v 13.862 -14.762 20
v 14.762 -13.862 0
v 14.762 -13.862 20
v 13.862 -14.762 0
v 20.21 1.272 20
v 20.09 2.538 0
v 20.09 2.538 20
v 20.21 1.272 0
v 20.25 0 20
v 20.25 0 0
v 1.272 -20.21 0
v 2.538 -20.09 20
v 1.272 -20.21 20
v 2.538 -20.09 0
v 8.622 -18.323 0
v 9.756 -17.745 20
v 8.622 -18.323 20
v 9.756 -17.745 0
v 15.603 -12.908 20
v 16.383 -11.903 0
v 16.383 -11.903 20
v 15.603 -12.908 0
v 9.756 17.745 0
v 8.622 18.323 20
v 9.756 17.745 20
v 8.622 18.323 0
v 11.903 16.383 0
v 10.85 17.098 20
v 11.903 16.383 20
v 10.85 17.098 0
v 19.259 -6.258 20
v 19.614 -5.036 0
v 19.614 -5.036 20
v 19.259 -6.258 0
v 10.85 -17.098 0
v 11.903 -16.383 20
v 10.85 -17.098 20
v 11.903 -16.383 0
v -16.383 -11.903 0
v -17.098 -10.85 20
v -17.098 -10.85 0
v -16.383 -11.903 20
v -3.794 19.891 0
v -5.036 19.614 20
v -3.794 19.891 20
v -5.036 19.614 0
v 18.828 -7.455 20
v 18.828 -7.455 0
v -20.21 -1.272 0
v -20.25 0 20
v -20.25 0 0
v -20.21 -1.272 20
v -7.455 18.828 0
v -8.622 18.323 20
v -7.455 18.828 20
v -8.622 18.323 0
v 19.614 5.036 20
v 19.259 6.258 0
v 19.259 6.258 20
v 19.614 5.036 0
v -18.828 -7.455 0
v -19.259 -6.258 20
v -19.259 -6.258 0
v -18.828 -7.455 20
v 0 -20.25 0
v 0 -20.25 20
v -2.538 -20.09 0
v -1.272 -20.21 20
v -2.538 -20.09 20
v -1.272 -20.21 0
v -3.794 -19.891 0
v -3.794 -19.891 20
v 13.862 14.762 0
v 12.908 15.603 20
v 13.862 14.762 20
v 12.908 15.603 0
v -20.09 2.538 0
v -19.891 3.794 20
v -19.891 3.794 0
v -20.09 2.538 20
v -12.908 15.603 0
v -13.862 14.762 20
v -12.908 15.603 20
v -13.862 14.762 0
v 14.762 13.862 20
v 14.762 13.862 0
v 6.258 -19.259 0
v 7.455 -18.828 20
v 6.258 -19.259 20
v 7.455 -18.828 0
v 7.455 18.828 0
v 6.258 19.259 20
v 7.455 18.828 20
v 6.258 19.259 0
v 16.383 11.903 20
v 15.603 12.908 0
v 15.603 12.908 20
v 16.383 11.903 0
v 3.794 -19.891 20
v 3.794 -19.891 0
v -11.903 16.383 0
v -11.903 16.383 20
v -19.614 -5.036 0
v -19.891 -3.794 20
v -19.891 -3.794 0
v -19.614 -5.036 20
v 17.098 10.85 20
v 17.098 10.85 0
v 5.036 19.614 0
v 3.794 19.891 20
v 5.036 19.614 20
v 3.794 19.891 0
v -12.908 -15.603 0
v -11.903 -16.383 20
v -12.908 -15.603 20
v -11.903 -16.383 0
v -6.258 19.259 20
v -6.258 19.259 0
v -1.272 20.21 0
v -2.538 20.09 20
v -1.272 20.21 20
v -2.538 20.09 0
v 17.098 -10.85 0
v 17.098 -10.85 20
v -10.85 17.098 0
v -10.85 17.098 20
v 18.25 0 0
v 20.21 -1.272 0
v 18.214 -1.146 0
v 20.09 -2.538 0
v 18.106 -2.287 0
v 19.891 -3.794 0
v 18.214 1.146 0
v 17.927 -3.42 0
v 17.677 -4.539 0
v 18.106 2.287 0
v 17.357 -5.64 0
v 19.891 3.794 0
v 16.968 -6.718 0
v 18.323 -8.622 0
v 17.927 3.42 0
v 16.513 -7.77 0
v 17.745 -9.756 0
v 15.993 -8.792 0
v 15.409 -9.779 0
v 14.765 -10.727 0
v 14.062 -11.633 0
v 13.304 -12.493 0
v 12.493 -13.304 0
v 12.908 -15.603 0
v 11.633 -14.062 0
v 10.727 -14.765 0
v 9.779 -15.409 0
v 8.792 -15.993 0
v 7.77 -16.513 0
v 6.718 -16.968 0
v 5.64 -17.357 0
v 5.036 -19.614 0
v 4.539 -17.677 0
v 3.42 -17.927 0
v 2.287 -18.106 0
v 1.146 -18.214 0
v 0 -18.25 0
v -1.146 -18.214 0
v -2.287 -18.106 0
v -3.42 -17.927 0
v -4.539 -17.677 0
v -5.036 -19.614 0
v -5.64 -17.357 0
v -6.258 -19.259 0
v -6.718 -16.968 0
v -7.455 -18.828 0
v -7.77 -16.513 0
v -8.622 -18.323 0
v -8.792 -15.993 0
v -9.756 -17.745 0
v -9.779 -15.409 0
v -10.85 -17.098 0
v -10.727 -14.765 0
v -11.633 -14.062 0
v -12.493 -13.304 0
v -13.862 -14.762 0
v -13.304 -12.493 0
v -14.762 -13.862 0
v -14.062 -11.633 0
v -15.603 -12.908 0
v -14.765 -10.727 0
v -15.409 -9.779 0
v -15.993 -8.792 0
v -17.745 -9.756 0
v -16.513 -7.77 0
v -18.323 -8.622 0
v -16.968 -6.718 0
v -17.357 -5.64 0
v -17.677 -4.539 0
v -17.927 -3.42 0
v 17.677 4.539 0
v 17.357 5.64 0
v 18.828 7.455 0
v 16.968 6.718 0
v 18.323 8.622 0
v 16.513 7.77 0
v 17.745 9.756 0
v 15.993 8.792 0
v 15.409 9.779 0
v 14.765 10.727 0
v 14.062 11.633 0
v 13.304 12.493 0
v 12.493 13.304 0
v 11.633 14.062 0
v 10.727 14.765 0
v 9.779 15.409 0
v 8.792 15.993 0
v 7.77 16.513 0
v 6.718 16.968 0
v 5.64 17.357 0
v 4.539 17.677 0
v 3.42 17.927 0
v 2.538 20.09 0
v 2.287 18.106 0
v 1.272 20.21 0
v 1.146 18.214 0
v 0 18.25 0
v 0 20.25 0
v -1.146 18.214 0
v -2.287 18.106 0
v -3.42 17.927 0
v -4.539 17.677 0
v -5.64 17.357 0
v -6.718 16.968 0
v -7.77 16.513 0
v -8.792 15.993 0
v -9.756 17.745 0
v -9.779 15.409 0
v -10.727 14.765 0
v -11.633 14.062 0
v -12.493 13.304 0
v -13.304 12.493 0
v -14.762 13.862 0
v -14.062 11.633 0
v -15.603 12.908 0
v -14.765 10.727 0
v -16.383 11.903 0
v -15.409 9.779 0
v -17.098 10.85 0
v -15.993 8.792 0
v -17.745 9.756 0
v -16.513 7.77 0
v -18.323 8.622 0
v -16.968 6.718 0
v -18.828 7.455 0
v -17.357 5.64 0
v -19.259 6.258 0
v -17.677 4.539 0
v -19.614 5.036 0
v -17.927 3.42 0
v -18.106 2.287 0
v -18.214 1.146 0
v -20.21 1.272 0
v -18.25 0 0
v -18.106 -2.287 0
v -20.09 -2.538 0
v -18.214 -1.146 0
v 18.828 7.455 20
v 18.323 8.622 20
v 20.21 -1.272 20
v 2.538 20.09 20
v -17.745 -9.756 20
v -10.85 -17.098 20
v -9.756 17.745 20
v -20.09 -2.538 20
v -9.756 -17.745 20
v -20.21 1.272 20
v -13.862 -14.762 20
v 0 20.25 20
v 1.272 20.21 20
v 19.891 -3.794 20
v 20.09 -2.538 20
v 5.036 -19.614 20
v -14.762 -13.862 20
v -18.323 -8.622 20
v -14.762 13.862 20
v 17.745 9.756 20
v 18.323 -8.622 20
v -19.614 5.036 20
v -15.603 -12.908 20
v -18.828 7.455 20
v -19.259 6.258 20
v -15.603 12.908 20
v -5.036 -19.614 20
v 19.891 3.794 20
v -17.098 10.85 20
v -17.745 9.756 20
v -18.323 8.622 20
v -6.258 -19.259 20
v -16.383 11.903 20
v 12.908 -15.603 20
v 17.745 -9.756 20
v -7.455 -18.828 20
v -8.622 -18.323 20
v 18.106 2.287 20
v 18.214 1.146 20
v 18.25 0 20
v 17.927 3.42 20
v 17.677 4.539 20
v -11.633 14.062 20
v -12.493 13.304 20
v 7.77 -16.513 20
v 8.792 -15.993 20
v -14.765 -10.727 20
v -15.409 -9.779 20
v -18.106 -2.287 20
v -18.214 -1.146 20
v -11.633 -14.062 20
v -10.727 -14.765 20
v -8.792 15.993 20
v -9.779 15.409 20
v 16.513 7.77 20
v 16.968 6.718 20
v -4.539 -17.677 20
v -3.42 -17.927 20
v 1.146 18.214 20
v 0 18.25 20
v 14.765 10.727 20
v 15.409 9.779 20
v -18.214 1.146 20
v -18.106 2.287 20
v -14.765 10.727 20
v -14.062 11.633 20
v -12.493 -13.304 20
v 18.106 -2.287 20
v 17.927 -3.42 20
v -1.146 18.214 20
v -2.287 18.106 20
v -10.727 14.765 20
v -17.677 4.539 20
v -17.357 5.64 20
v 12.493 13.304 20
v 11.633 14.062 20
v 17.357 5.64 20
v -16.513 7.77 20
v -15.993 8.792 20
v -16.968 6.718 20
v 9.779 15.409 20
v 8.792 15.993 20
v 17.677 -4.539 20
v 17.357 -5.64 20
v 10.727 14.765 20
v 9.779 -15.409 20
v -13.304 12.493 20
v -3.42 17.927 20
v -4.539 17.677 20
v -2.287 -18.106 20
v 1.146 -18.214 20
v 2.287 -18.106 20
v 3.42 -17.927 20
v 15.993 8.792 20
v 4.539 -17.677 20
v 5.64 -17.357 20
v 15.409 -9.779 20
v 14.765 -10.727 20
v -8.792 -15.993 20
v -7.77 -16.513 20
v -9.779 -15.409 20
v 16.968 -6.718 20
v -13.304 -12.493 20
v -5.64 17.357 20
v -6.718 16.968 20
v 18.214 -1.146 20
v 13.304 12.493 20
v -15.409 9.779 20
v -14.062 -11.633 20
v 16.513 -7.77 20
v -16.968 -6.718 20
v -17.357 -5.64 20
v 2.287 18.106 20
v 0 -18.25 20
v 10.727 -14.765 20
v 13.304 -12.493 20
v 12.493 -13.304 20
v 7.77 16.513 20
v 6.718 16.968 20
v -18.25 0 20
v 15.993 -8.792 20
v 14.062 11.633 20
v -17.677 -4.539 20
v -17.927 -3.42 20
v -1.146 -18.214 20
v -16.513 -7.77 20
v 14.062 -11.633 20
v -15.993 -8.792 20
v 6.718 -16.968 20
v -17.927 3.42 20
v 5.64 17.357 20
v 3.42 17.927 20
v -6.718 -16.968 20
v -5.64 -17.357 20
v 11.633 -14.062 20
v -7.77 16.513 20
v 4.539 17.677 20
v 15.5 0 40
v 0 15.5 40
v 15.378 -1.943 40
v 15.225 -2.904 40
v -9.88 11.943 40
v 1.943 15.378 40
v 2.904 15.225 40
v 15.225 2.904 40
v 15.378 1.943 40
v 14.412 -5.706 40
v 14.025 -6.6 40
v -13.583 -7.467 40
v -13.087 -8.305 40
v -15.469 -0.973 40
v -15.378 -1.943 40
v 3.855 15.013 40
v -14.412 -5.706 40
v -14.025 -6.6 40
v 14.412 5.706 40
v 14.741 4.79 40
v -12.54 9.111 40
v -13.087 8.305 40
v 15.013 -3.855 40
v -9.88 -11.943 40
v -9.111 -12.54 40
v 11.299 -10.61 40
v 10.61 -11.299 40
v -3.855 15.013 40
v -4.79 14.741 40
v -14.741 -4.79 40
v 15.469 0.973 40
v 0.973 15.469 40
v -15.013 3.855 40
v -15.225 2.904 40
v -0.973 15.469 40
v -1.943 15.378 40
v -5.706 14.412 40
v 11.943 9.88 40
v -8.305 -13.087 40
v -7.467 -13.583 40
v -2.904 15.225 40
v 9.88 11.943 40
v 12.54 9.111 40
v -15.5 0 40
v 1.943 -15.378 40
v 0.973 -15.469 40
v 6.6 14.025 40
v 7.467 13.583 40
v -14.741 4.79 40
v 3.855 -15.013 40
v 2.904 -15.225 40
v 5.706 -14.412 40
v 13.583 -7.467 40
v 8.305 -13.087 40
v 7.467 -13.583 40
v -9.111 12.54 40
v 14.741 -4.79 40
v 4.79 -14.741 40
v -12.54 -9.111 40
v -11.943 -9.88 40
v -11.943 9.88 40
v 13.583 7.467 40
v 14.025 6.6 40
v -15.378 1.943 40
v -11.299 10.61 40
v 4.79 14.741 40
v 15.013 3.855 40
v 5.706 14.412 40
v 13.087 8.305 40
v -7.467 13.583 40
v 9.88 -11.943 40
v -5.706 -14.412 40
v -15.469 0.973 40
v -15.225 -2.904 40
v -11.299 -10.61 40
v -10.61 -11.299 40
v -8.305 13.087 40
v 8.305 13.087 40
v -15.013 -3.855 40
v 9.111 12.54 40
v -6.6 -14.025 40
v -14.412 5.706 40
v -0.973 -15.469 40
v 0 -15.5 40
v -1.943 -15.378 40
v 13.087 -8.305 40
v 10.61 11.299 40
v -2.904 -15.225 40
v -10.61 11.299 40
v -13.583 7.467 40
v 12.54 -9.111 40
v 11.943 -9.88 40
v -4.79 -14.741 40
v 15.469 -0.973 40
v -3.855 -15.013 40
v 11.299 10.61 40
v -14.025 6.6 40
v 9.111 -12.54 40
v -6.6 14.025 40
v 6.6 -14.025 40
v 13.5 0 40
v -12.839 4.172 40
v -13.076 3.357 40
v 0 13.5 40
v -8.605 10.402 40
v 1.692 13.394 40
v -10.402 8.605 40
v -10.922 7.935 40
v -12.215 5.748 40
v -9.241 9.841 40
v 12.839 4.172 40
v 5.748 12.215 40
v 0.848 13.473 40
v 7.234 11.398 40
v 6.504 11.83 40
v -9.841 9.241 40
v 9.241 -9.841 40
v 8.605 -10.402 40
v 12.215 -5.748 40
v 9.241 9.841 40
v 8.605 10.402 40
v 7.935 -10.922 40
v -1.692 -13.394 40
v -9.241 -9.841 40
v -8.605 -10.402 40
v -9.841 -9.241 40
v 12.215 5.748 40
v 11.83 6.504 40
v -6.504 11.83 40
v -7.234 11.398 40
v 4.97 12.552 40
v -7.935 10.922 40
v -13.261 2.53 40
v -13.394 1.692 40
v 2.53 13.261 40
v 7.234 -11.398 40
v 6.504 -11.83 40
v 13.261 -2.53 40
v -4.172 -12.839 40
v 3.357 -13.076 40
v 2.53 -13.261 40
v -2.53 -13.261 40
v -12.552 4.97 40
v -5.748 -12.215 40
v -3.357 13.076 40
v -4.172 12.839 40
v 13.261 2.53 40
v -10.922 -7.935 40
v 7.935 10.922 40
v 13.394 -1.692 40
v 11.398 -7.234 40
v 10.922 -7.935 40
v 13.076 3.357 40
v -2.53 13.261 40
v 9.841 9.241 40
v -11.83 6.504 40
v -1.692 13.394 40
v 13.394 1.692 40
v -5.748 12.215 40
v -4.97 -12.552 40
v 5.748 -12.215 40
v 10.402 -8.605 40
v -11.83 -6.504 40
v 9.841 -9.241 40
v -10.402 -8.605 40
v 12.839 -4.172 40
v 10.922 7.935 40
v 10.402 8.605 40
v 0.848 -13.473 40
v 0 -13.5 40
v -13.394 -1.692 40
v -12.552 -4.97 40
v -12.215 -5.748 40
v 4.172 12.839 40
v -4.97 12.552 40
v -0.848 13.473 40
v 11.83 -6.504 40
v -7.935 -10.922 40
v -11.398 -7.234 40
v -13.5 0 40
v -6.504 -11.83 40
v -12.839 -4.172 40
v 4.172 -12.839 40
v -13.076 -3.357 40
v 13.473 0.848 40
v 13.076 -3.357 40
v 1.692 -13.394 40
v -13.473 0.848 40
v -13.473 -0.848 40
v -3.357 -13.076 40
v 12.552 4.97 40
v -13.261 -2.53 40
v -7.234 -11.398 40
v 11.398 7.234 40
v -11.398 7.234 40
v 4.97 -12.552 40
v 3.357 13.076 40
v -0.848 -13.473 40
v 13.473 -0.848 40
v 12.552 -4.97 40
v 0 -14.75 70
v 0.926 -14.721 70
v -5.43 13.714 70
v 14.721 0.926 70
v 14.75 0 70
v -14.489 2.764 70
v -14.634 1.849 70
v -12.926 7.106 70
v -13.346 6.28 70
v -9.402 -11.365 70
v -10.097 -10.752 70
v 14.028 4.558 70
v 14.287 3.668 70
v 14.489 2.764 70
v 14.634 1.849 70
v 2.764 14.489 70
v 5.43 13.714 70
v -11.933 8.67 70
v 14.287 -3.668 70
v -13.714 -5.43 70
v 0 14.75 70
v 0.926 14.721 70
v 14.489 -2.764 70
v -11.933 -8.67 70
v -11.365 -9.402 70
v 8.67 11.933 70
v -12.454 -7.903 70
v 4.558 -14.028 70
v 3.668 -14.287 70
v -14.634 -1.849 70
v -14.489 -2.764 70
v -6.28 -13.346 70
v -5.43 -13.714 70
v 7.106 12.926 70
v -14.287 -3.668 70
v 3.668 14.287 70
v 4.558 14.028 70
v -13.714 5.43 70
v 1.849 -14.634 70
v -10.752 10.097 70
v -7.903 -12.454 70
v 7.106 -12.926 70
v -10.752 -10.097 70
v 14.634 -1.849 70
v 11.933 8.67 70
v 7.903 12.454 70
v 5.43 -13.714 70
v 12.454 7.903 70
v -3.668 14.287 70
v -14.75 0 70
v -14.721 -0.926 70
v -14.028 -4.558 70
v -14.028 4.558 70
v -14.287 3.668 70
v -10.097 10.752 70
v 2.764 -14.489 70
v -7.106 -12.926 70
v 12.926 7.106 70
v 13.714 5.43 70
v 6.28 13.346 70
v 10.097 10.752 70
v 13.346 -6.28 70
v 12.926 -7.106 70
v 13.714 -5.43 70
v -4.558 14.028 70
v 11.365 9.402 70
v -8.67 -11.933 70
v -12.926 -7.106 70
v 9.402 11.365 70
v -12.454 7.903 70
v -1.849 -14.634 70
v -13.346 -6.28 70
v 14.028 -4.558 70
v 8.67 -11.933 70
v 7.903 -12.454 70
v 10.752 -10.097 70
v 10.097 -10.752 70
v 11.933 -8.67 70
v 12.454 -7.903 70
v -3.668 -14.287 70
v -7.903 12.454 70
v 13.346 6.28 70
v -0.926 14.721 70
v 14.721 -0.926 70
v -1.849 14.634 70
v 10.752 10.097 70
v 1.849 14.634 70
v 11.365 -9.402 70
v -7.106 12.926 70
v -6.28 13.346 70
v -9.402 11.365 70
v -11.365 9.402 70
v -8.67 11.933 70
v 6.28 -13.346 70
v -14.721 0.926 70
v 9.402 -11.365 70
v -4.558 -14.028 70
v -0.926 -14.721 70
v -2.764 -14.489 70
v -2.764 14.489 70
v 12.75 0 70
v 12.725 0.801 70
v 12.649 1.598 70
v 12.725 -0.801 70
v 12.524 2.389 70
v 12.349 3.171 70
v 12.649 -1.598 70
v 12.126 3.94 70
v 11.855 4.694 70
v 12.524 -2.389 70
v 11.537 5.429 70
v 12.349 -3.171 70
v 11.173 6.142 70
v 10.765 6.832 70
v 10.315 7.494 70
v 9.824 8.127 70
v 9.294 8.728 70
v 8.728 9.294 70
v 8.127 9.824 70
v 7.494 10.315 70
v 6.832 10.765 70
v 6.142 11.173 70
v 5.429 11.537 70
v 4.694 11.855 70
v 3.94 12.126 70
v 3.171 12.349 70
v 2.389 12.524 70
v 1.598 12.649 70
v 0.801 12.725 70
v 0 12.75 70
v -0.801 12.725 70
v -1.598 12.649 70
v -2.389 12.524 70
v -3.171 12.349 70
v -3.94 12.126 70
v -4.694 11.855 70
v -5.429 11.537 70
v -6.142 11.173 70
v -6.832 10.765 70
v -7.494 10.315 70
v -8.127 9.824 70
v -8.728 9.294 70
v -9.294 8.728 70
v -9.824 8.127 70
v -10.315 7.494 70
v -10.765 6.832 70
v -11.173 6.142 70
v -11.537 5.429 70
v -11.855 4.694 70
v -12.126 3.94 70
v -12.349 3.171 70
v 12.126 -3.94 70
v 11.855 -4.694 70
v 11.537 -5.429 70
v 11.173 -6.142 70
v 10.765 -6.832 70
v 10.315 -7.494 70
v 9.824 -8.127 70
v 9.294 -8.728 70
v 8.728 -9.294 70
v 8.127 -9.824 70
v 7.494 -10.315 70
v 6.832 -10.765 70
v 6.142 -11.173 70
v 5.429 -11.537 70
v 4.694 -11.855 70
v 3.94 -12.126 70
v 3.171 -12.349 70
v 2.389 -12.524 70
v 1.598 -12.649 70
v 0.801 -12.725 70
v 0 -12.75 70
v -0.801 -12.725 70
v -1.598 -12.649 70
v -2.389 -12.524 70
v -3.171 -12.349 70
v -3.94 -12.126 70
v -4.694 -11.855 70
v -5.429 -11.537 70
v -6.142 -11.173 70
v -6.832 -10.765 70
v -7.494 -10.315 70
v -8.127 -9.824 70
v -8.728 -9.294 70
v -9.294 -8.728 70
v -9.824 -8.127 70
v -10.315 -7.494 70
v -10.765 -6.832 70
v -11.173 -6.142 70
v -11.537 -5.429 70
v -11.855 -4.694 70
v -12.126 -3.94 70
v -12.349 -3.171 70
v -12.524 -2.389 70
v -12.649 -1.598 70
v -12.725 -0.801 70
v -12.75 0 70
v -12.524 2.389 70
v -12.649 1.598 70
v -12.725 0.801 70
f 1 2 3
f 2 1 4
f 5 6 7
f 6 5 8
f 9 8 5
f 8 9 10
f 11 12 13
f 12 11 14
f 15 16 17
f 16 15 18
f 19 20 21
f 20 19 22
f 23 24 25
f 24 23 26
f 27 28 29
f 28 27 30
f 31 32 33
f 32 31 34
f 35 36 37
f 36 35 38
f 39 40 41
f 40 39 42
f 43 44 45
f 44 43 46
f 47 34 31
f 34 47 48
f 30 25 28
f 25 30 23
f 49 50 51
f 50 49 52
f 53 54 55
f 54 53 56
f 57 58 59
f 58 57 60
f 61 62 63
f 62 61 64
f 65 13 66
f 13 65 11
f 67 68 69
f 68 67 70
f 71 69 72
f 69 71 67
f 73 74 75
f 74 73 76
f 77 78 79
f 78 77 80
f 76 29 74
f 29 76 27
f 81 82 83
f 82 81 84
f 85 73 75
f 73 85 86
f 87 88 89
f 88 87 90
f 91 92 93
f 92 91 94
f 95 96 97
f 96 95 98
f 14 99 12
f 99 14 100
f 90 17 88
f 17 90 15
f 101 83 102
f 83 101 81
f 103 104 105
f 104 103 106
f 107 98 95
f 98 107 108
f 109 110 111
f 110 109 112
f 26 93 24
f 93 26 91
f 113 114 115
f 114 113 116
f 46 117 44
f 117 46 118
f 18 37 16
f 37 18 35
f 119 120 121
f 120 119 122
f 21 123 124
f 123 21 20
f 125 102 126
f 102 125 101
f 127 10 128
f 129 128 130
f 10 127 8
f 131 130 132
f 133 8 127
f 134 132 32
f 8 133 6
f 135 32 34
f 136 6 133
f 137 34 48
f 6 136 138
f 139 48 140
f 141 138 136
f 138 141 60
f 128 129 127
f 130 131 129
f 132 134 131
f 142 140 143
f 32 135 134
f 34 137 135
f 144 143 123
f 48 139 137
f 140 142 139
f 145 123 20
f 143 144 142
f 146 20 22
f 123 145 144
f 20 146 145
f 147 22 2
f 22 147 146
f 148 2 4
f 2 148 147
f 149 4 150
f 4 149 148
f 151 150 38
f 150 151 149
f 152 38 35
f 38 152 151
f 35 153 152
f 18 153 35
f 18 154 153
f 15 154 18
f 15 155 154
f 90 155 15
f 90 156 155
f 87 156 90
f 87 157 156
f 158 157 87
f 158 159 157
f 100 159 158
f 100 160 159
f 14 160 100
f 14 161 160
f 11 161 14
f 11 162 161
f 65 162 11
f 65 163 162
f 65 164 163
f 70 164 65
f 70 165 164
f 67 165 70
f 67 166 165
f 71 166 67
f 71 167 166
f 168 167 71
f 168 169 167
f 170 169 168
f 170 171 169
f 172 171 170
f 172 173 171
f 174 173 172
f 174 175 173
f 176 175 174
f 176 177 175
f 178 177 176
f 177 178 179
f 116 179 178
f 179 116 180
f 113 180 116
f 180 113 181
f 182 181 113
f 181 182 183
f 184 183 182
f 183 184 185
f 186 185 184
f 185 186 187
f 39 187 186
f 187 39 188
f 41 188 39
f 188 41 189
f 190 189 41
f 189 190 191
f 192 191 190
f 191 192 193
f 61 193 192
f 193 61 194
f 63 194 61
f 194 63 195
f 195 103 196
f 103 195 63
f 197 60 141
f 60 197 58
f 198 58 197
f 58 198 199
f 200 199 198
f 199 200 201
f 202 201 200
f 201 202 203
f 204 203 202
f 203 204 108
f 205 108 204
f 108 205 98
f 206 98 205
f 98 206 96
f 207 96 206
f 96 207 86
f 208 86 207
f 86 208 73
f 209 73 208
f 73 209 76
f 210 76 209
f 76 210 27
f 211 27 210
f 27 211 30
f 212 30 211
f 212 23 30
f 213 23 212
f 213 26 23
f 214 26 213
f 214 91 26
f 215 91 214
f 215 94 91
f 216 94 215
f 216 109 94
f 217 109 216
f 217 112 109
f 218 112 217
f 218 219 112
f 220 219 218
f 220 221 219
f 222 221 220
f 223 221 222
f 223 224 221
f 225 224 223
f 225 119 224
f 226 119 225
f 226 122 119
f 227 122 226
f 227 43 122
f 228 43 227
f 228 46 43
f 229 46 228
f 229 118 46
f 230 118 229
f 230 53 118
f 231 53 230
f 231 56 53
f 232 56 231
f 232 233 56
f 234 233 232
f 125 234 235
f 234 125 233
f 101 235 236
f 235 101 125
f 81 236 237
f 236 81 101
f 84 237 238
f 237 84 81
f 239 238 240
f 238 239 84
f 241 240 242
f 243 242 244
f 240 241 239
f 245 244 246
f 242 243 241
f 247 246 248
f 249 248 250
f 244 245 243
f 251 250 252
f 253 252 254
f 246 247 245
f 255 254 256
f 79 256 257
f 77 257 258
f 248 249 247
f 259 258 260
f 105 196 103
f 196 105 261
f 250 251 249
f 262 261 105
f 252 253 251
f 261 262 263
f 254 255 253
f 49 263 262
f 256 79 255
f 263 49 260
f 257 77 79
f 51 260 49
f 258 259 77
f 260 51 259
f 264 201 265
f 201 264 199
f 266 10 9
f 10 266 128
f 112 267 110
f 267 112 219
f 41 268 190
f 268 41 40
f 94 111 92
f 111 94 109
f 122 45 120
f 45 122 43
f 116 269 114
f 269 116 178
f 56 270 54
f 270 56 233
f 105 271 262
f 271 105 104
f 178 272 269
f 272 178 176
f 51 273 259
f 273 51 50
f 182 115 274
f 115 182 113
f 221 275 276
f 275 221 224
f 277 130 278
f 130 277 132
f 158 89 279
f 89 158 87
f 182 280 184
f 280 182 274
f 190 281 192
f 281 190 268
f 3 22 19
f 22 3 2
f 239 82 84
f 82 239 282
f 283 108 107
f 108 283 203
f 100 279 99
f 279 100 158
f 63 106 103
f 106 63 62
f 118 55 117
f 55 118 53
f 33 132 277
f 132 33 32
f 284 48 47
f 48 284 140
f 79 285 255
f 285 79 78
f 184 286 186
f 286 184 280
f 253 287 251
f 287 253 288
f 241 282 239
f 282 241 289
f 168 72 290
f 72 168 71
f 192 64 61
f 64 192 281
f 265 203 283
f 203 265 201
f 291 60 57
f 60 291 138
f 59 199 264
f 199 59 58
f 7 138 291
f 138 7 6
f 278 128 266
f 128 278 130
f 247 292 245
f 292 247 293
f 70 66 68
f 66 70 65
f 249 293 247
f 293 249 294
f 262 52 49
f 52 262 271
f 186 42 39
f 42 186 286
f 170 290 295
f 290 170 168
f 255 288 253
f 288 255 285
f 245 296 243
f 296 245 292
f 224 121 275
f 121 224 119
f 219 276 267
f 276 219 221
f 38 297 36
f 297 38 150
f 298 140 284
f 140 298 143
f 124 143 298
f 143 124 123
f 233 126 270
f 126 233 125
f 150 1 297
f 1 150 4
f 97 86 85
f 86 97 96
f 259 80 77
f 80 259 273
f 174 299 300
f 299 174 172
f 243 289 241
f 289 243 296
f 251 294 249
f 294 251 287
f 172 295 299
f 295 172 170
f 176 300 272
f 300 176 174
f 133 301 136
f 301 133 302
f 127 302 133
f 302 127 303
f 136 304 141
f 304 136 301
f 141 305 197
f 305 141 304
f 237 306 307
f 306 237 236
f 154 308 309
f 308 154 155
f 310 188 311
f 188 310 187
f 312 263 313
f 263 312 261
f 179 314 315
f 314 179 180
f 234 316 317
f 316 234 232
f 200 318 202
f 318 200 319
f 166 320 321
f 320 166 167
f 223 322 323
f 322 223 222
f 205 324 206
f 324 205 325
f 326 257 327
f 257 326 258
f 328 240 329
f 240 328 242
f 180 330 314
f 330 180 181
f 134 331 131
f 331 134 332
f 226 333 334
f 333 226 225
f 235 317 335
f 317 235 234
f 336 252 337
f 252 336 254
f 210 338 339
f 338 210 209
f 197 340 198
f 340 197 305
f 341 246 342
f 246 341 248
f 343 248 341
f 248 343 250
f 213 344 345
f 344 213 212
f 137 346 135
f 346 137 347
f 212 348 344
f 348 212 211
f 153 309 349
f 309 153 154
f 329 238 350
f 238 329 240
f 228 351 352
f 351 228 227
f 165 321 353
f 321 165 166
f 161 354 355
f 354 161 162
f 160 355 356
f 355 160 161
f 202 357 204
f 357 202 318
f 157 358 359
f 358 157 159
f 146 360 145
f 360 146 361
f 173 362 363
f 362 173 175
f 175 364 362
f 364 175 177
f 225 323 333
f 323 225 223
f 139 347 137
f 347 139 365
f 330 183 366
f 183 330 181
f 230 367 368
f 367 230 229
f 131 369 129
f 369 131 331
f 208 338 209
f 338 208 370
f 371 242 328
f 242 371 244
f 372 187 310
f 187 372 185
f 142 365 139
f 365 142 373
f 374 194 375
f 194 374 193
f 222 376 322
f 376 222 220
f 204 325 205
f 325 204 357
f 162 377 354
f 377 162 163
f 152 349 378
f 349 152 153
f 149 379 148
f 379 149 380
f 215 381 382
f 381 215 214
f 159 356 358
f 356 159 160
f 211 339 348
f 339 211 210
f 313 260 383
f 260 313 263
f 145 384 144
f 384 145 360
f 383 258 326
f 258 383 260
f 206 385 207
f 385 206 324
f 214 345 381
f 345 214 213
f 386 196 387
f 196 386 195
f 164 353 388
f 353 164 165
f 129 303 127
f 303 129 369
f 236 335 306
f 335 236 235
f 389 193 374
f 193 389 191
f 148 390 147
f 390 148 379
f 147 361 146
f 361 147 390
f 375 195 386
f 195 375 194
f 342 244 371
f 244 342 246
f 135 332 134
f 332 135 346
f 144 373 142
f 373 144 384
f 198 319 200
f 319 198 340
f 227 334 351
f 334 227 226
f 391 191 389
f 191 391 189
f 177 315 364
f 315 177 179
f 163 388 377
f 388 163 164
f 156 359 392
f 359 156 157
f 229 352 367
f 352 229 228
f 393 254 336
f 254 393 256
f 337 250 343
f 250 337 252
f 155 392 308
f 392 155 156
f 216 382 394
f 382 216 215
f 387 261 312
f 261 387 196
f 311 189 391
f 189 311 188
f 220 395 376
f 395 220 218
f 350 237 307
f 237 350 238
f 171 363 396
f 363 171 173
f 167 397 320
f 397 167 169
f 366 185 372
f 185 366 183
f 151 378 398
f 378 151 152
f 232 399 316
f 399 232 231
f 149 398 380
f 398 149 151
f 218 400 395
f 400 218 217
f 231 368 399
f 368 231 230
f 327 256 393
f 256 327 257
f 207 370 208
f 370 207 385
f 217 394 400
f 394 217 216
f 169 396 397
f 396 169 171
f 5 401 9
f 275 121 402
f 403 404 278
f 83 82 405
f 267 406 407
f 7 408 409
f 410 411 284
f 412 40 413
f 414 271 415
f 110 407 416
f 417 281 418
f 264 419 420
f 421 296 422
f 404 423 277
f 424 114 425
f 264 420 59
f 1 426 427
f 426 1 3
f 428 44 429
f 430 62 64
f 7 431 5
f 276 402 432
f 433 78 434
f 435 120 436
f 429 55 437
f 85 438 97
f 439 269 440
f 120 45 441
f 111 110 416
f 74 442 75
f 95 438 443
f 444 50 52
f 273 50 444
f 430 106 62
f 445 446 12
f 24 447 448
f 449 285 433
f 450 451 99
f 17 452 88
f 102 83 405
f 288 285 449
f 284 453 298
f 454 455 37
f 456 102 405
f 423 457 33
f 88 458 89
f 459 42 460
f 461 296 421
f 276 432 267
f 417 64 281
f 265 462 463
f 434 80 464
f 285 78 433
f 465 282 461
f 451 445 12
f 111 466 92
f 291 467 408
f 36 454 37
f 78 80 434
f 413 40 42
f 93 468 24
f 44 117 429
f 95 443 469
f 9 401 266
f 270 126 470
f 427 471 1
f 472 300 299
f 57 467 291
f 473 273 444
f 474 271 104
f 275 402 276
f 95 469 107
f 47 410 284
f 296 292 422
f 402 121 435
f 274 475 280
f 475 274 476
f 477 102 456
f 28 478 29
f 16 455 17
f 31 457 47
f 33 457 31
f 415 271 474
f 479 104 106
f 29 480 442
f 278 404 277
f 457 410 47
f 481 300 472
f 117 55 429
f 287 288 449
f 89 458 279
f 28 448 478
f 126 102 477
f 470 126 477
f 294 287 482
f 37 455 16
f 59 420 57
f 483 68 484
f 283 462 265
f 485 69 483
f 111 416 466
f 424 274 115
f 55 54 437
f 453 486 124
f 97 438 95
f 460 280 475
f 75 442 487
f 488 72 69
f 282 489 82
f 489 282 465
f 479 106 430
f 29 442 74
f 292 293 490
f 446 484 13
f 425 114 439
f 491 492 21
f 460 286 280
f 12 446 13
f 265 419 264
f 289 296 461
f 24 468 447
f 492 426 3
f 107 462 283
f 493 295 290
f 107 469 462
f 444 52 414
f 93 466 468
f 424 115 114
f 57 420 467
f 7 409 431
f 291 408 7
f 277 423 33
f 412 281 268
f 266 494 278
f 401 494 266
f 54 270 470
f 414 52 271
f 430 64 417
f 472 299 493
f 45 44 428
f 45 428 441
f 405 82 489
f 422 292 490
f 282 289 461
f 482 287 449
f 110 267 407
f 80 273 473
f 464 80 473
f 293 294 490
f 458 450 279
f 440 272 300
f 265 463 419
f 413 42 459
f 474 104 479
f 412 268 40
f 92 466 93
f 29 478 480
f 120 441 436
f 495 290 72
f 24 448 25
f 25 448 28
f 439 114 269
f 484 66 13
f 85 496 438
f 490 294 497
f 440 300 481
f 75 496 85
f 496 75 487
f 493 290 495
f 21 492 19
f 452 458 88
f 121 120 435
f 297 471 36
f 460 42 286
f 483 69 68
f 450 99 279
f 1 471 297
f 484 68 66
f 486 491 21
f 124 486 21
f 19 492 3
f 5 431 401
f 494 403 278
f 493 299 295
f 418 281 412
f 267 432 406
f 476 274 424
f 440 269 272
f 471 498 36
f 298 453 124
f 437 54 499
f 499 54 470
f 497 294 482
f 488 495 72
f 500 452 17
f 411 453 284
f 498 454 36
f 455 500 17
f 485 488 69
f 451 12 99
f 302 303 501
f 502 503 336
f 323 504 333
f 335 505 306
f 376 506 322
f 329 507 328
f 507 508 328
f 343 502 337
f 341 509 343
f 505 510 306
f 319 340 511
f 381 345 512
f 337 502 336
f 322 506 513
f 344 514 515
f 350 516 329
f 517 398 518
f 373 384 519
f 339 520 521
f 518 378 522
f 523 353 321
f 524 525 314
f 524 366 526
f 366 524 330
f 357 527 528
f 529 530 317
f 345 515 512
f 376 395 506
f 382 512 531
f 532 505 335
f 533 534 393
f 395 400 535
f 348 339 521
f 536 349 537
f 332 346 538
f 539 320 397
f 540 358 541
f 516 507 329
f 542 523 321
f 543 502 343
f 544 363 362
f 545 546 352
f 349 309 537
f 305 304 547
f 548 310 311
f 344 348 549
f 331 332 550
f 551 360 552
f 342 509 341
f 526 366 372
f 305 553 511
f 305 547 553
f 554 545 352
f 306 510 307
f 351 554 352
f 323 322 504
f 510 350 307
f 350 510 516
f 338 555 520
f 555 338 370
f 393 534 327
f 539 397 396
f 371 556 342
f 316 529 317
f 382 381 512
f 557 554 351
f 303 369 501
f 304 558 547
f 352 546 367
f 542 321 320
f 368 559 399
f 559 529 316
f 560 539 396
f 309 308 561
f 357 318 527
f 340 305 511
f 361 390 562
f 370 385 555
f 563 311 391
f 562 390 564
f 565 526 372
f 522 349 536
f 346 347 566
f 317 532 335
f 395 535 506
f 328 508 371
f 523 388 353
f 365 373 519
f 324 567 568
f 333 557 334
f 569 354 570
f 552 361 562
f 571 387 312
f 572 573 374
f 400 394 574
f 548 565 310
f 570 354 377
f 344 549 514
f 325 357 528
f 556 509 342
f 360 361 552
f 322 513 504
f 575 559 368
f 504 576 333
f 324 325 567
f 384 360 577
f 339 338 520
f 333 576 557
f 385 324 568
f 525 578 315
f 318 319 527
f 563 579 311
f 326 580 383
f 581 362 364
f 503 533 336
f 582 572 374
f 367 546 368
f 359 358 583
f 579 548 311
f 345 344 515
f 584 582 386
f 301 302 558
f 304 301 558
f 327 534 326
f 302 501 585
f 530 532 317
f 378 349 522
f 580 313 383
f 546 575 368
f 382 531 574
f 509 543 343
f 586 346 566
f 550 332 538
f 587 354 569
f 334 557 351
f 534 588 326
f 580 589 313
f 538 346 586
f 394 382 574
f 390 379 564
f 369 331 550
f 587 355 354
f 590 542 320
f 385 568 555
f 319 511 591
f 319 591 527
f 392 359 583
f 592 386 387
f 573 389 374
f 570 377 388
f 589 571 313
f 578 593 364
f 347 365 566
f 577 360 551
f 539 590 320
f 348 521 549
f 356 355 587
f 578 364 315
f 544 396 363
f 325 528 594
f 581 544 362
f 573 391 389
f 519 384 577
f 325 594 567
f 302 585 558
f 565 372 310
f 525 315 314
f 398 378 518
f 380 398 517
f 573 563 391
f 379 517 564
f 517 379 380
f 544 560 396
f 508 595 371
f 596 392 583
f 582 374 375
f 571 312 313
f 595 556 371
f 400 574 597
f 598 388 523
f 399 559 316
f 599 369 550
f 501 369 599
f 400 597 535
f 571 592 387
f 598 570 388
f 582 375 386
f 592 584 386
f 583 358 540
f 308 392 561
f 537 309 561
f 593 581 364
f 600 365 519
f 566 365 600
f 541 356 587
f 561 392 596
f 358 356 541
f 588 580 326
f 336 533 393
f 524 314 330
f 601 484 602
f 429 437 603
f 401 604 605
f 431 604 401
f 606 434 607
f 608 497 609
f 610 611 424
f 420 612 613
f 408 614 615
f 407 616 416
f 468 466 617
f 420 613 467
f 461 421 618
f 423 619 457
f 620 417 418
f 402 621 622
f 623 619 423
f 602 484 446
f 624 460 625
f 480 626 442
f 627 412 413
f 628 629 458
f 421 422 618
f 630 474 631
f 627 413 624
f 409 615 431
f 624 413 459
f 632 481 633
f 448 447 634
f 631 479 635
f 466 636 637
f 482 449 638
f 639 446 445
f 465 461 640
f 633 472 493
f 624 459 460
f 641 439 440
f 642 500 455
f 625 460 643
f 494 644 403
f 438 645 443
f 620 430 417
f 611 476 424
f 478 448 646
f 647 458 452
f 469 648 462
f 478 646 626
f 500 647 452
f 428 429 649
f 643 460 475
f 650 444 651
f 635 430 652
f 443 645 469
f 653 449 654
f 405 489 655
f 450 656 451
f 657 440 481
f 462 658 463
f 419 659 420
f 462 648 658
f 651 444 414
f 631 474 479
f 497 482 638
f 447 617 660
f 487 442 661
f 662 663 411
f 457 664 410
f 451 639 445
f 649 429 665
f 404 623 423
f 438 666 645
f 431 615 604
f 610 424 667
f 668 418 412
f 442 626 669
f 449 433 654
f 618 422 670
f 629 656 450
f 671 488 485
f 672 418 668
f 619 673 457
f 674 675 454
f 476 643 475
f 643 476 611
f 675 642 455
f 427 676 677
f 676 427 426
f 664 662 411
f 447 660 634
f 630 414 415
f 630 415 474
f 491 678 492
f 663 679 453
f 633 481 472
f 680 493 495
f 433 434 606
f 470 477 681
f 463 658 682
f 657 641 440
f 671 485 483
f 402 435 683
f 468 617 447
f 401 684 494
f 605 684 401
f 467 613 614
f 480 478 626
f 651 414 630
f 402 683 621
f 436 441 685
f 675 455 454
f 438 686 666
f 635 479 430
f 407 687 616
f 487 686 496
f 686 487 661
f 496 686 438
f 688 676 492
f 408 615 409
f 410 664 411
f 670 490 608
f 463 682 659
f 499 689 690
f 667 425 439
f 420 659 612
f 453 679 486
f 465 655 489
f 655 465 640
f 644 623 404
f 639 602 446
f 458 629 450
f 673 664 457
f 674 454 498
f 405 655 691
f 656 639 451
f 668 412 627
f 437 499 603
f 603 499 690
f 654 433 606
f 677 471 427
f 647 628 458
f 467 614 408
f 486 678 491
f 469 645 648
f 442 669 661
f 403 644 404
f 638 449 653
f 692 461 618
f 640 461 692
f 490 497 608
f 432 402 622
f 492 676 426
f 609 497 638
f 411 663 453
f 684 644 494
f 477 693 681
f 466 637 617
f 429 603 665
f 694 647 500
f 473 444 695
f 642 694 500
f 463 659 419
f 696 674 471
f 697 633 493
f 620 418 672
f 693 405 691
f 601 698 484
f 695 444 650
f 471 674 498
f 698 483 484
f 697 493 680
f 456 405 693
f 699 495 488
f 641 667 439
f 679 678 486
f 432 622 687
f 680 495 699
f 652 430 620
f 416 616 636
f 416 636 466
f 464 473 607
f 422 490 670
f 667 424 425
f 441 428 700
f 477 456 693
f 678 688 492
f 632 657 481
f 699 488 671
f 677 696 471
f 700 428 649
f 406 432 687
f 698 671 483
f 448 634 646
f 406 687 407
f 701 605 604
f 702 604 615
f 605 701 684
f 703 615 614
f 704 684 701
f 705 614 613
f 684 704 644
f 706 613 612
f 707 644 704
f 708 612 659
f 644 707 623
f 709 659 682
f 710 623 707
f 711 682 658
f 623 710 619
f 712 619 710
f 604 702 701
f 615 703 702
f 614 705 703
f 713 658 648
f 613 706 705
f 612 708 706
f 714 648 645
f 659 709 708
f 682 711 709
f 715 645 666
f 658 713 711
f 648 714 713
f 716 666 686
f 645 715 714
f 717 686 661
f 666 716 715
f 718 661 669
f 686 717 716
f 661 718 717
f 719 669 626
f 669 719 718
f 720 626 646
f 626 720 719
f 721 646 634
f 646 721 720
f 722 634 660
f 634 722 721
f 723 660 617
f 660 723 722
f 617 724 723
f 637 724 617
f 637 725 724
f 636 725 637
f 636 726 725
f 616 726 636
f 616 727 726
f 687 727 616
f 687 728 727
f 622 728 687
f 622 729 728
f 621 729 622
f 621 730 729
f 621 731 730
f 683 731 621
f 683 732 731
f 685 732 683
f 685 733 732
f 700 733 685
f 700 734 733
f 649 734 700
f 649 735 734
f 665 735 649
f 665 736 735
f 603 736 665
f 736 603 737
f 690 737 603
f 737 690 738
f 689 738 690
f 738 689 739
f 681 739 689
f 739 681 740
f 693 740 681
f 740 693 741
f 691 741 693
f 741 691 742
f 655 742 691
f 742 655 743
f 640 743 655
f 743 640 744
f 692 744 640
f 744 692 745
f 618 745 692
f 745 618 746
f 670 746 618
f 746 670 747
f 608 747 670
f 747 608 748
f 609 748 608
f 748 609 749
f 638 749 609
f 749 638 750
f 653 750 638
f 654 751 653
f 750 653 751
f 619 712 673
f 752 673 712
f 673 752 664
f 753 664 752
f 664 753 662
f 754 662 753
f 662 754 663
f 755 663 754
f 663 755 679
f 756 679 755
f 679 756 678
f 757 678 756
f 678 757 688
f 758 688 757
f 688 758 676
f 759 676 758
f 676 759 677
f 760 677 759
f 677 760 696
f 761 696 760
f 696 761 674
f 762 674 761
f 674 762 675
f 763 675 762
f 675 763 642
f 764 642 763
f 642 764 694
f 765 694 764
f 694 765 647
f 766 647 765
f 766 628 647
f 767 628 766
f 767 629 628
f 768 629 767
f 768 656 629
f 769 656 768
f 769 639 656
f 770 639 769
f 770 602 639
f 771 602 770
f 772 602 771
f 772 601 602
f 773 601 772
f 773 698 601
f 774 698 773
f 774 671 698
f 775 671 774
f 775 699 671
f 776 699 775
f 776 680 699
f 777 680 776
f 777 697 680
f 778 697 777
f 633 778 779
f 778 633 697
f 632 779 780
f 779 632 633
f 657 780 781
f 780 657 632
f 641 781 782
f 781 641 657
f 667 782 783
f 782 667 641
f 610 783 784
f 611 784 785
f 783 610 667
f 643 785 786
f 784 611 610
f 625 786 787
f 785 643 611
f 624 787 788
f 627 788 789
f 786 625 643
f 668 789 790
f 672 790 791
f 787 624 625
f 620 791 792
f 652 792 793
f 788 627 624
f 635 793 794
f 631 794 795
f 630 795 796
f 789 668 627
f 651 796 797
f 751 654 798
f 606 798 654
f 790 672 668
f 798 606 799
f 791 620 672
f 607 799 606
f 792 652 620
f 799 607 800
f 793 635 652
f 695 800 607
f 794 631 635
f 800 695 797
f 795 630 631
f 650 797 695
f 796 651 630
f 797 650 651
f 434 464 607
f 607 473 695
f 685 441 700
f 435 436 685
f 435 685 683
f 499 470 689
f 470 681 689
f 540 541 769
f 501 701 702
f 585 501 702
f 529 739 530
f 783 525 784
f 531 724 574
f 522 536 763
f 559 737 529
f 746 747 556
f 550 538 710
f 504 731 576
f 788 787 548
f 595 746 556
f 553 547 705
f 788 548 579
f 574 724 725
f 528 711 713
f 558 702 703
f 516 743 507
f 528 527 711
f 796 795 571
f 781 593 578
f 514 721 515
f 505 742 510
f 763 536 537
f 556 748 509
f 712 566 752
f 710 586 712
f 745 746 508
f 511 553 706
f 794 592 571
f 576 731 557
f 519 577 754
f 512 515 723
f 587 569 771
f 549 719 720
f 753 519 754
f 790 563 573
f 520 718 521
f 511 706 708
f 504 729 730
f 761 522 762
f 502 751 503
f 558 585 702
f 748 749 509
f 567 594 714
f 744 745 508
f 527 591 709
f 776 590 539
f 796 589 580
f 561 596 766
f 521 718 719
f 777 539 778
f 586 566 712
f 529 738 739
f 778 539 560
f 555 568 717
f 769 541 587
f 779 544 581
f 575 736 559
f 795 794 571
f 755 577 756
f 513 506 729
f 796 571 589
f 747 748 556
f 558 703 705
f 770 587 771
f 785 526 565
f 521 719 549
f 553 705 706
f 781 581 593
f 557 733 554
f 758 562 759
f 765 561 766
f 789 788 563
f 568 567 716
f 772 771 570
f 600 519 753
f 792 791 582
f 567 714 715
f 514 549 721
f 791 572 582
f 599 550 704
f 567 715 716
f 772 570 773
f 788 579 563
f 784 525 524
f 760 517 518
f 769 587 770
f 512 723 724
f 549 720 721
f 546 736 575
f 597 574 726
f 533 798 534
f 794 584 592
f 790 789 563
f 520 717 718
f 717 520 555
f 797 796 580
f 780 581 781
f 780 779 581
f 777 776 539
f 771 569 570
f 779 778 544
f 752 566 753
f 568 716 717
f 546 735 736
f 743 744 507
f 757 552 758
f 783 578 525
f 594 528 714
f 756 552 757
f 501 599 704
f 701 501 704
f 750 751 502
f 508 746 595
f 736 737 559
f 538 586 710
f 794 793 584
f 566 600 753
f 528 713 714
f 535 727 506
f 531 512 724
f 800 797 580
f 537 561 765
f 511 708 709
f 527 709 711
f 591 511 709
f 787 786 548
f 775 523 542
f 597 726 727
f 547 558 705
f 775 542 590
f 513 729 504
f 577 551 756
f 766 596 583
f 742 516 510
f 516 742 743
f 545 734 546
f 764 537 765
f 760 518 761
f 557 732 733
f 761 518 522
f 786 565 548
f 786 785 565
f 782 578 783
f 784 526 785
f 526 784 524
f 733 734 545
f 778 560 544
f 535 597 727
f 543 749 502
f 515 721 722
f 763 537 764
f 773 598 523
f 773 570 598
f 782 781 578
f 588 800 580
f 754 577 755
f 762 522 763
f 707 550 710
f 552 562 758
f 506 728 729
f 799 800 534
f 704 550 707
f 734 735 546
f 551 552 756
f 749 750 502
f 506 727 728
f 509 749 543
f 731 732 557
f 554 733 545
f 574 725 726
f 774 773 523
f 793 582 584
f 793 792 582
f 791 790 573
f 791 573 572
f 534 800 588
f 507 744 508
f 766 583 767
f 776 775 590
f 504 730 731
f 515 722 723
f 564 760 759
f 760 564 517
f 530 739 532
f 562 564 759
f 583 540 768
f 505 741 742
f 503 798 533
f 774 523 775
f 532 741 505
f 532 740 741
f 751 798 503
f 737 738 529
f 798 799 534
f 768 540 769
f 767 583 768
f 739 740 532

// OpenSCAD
$fn=100;
wall_thickness = 2;
section_length = 20;
end_taper = 1.5;

start_int_dia = 36.5;
start_ext_dia = start_int_dia + 2 * wall_thickness;

end_ext_dia = 31.0;
end_int_dia = end_ext_dia - 2 * wall_thickness;


module start_tube() {
    difference() {
        cylinder(section_length, d = start_ext_dia);
        cylinder(section_length, d = start_int_dia);
    }
}

module middle_tube() {
    difference() {
        cylinder(section_length, d1 = start_ext_dia, d2 = end_ext_dia);
        cylinder(section_length, d1 = start_int_dia, d2 = end_int_dia);
    }
}

module end_tube() {
    difference() {
        cylinder(section_length*1.5, d1 = end_ext_dia, d2 = end_ext_dia-end_taper);
        cylinder(section_length*1.5, d1 = end_int_dia, d2 = end_int_dia-end_taper);
    }
}

module adaptor() {
    start_tube();
    translate([0, 0, section_length]) middle_tube();
    translate([0, 0, section_length*2]) end_tube();    
}


adaptor();
    
    
